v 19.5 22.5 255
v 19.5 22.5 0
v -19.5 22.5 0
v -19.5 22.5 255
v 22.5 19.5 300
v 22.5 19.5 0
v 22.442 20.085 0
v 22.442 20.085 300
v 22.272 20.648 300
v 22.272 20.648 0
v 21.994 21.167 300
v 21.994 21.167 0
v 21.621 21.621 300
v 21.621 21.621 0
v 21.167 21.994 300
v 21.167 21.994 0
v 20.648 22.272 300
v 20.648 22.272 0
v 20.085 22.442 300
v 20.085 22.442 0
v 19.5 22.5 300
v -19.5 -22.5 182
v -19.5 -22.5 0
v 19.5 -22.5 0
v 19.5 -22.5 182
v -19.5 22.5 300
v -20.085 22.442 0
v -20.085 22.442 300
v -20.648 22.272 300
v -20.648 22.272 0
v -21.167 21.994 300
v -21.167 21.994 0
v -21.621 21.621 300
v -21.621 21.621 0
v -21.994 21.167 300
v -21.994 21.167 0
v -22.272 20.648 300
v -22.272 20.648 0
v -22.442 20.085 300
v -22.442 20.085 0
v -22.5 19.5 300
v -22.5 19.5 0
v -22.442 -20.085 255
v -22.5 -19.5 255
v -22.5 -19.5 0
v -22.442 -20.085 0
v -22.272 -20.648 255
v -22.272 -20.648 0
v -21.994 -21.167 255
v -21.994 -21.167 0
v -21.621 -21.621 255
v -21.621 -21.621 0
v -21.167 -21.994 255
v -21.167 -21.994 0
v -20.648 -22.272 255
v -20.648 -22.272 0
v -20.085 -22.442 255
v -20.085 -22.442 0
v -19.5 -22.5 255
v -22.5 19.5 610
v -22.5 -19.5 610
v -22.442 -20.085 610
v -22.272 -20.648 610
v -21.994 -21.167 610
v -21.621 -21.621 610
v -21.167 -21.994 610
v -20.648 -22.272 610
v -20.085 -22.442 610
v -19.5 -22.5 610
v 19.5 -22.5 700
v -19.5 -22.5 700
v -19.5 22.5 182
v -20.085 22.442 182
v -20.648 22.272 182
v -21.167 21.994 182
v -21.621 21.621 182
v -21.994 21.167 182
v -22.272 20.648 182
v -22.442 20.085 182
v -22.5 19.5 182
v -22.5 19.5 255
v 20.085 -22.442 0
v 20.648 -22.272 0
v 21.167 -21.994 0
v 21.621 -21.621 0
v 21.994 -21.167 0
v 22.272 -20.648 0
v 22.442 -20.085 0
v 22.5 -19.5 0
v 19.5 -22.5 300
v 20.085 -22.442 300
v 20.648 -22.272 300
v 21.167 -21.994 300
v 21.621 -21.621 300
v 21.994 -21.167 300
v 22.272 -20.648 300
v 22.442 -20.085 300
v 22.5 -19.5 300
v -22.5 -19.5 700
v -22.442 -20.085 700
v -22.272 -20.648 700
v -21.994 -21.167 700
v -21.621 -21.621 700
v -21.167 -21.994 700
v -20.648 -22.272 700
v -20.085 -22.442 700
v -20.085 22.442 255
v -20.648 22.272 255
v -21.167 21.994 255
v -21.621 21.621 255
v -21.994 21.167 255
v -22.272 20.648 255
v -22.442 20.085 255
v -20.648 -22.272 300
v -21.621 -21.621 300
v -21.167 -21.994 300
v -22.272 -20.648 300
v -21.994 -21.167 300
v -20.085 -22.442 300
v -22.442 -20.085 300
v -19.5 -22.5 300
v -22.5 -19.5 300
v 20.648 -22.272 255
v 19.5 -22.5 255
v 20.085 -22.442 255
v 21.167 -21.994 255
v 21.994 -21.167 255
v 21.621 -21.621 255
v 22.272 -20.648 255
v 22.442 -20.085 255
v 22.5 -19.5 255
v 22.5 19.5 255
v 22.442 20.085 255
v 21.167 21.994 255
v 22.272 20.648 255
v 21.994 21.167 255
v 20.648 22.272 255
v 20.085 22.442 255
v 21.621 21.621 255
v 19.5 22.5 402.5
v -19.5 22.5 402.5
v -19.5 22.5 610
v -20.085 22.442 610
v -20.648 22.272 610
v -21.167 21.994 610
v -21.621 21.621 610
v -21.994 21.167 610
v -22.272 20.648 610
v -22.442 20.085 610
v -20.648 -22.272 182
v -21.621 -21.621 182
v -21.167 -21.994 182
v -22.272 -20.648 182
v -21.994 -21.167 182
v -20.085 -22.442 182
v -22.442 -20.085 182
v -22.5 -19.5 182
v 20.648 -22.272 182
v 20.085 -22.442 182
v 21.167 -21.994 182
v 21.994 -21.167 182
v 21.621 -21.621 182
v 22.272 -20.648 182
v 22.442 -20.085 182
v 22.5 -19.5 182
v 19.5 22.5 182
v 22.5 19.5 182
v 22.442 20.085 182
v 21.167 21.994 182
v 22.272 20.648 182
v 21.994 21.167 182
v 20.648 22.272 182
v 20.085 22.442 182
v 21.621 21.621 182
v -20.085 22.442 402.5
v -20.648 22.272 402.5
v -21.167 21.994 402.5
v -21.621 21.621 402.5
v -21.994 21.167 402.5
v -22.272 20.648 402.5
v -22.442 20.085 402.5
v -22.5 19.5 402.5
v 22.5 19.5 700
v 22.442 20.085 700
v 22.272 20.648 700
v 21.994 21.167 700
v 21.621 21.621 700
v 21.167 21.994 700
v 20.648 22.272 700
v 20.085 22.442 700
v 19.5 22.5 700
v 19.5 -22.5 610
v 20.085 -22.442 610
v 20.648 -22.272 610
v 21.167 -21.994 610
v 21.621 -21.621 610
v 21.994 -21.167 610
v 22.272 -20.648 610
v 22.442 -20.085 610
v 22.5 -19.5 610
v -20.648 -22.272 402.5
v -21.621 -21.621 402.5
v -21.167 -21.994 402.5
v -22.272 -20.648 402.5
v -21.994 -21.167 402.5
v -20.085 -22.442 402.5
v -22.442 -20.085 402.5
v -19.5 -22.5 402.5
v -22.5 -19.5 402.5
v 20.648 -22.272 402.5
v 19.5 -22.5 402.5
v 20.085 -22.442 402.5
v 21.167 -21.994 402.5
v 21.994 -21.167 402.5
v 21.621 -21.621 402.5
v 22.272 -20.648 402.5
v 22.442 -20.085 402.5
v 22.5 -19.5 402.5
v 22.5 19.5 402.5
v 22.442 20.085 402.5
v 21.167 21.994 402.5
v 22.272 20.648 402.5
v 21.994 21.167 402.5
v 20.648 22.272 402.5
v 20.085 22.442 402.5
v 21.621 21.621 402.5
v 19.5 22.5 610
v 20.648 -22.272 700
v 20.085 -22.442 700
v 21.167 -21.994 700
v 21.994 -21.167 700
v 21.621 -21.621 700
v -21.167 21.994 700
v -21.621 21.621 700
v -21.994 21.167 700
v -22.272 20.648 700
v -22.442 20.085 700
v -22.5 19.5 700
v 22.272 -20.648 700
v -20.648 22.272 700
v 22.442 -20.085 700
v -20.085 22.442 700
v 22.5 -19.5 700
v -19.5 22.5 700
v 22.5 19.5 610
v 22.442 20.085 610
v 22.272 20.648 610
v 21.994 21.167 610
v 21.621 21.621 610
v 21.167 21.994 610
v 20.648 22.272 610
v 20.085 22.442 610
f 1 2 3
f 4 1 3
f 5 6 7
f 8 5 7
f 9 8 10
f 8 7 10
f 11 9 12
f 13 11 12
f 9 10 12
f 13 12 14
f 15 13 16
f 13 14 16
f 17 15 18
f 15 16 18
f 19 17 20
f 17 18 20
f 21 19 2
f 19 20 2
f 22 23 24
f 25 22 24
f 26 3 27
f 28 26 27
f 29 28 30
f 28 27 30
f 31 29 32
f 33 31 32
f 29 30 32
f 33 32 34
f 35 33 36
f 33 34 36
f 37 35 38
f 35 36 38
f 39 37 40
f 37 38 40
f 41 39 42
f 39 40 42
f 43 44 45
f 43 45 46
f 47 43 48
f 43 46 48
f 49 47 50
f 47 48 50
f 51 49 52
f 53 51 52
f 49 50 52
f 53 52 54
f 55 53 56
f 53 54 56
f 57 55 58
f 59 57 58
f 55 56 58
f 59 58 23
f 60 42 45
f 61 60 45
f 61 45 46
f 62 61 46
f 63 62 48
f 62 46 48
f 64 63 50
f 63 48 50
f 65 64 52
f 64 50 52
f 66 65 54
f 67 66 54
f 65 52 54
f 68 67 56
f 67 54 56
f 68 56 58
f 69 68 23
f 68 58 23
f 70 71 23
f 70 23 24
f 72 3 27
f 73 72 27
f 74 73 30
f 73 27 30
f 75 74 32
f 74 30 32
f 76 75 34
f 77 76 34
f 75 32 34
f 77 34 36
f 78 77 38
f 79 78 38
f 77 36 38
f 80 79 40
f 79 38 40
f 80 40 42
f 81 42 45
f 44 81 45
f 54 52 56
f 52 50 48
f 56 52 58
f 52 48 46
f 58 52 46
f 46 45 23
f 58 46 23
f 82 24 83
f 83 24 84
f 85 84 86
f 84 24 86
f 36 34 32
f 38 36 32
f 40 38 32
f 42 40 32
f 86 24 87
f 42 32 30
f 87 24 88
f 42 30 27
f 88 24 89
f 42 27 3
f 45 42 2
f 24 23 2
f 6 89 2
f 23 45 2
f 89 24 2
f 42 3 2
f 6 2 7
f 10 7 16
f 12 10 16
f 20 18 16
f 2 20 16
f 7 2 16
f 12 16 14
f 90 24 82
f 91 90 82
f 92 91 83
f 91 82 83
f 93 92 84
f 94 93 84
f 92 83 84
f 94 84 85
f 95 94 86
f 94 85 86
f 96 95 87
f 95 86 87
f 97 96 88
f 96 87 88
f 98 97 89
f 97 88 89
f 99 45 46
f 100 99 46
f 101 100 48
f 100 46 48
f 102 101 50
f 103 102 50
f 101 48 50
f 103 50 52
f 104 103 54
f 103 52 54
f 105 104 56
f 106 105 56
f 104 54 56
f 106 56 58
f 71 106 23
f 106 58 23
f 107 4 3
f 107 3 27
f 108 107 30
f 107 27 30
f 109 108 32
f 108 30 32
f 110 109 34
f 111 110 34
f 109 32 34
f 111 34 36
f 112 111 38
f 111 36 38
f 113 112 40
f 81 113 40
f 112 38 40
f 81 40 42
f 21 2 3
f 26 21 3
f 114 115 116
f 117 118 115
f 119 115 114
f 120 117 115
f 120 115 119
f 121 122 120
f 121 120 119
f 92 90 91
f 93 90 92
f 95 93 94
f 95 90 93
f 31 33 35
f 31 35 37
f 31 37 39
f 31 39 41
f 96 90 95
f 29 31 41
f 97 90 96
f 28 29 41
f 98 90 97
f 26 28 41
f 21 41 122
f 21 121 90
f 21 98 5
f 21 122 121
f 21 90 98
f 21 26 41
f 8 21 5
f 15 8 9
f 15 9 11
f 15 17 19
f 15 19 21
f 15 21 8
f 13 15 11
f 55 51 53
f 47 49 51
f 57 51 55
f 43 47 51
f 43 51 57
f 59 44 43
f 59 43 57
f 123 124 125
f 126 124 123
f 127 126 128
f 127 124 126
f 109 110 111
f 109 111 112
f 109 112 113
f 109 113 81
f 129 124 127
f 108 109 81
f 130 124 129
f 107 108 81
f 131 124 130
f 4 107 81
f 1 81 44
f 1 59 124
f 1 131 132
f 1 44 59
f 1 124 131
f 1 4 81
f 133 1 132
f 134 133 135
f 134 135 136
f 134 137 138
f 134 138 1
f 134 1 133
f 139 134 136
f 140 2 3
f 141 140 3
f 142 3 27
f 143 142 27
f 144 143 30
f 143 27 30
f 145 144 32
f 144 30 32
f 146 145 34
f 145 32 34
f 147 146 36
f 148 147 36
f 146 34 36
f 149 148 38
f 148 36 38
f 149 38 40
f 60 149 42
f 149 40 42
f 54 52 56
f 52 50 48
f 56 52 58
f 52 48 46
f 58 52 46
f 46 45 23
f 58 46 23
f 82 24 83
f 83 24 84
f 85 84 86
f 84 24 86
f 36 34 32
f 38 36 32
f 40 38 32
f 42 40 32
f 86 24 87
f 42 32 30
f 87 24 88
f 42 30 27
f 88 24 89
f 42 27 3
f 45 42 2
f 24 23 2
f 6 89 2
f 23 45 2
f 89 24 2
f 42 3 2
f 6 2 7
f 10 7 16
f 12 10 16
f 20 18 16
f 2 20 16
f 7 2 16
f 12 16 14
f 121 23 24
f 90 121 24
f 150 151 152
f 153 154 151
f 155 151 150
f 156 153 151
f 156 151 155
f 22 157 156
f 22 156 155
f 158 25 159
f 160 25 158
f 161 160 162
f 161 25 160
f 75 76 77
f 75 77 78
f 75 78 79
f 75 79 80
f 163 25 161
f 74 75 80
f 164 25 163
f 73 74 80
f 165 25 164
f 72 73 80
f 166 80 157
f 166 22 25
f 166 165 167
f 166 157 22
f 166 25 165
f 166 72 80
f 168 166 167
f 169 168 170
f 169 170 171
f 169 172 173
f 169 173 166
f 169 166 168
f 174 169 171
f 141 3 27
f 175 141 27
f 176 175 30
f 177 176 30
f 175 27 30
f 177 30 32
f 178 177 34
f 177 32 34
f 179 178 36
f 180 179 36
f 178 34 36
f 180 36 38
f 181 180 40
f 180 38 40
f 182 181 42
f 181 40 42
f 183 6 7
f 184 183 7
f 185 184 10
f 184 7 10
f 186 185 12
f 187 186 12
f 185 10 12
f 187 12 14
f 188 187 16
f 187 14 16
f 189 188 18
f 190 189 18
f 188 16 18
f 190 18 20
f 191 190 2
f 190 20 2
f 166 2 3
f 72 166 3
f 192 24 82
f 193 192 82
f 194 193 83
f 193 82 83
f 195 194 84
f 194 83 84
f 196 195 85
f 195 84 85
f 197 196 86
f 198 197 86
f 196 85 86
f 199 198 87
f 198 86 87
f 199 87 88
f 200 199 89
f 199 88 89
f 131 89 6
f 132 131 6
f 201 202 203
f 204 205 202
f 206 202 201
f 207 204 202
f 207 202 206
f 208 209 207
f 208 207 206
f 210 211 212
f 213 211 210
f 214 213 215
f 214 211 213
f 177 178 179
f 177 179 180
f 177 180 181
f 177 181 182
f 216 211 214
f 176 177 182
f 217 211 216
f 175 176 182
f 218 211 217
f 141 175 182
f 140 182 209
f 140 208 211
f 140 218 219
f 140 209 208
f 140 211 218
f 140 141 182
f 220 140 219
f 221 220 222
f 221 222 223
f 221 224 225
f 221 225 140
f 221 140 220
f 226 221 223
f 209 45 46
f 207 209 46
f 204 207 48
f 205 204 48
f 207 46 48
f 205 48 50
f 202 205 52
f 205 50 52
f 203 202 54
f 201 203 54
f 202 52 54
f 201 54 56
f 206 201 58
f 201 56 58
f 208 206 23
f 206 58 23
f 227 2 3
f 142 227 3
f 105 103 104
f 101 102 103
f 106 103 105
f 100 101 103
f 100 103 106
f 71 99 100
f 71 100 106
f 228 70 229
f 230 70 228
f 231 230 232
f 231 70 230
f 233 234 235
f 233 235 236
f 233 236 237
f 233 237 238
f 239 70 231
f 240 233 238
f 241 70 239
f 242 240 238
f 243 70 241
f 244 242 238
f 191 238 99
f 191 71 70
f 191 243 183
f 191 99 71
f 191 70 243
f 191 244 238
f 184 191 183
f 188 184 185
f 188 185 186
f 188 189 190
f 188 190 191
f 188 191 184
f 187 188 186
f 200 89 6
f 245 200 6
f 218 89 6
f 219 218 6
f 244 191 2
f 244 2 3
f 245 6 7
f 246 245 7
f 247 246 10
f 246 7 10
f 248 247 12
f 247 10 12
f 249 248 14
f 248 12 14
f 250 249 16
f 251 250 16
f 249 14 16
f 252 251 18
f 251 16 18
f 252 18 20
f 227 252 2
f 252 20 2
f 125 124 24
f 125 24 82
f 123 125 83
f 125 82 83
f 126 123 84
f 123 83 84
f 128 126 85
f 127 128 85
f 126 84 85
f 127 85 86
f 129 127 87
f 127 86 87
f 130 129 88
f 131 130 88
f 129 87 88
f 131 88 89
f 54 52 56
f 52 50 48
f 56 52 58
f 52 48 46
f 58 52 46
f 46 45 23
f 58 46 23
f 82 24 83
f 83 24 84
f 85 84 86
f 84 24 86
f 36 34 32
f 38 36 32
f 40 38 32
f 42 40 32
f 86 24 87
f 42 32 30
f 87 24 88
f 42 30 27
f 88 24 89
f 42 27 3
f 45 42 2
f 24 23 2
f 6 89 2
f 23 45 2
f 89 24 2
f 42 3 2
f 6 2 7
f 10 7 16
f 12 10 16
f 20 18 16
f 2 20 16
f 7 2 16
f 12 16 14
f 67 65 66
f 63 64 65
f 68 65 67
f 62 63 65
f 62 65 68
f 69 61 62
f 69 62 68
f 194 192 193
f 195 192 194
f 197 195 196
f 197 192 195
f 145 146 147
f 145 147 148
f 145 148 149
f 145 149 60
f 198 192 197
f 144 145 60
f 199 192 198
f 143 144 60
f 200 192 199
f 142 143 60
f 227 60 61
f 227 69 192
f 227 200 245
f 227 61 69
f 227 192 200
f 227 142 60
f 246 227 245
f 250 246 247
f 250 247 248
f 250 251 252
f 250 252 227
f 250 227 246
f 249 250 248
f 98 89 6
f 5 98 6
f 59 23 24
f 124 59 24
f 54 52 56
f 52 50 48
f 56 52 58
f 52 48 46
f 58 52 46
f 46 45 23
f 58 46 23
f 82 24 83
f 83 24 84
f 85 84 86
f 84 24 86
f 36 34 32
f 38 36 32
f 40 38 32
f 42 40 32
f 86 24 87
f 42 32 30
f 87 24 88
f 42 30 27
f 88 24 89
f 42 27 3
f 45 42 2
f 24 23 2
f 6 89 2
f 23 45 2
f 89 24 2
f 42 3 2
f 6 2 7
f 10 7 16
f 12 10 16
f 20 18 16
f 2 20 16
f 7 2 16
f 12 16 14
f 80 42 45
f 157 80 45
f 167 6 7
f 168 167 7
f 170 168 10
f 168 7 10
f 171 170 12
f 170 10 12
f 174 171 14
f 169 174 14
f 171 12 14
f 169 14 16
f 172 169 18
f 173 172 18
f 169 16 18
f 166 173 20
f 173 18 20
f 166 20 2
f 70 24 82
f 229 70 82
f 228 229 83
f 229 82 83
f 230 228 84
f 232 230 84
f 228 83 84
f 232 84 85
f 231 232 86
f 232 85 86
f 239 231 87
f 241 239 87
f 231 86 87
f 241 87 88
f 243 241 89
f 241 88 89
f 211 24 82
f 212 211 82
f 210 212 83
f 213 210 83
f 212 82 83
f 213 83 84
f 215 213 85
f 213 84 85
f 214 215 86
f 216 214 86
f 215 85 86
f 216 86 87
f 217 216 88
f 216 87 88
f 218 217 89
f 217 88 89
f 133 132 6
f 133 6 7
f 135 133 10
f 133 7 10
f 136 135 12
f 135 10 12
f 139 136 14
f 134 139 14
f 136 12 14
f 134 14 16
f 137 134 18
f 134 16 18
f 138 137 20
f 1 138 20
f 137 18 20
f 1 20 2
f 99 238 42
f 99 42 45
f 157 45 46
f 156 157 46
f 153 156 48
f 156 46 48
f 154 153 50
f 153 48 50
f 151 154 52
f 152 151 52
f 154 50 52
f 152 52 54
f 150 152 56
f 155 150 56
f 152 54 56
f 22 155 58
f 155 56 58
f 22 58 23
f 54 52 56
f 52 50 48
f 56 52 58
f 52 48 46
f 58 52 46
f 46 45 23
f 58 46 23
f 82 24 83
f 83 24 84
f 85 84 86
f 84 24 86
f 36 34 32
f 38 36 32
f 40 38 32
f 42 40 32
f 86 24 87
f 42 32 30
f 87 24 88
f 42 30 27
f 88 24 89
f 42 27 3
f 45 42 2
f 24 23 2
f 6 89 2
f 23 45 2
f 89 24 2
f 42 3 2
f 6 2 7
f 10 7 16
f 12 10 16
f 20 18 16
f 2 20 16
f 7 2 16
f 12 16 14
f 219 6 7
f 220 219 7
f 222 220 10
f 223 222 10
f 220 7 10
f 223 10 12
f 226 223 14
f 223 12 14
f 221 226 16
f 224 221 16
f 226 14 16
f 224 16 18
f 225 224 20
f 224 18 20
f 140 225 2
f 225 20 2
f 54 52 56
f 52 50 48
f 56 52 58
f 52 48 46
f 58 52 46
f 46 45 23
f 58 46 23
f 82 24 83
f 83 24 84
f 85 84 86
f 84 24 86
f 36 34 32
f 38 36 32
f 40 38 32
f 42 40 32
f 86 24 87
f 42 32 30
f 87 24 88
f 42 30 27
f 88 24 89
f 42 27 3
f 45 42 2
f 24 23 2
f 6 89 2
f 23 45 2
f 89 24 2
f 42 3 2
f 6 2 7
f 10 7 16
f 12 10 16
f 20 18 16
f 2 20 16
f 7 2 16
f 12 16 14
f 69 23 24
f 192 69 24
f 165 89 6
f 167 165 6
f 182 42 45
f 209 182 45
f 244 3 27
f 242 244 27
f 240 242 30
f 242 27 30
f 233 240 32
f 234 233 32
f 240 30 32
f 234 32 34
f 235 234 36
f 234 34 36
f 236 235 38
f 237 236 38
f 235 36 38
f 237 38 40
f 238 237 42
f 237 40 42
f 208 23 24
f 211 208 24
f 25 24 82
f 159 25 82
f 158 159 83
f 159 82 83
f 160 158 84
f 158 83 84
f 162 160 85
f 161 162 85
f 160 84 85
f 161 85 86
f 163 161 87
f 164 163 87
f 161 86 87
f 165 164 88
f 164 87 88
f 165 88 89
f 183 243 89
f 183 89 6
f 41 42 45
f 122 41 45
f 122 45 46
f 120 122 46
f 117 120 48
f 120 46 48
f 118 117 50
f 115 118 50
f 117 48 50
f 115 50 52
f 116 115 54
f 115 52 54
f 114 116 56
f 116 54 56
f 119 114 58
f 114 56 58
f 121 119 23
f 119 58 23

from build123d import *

# Parameters (mm, degrees)
F1_DEPTH = 610
F2_DEPTH = 700
F3_DEPTH = 300
F4_DEPTH = 255
F5_DEPTH = 182
F6_DEPTH = 402.5


with BuildPart() as f1:
    # F0 (on Top) → F1 (new body)
    with BuildSketch(Plane.XY):
        with BuildLine():
            ThreePointArc((22.5, 19.5), (21.62132, 21.62132), (19.5, 22.5))
            Line((19.5, 22.5), (-19.5, 22.5))
            ThreePointArc((-19.5, 22.5), (-21.62132, 21.62132), (-22.5, 19.5))
            Line((-22.5, 19.5), (-22.5, -19.5))
            ThreePointArc((-22.5, -19.5), (-21.62132, -21.62132), (-19.5, -22.5))
            Line((-19.5, -22.5), (19.5, -22.5))
            ThreePointArc((19.5, -22.5), (21.62132, -21.62132), (22.5, -19.5))
            Line((22.5, -19.5), (22.5, 19.5))
        make_face()
    extrude(amount=F1_DEPTH)


with BuildPart() as f2:
    # F0 (on Top) → F2 (new body)
    with BuildSketch(Plane.XY):
        with BuildLine():
            ThreePointArc((22.5, 19.5), (21.62132, 21.62132), (19.5, 22.5))
            Line((19.5, 22.5), (-19.5, 22.5))
            ThreePointArc((-19.5, 22.5), (-21.62132, 21.62132), (-22.5, 19.5))
            Line((-22.5, 19.5), (-22.5, -19.5))
            ThreePointArc((-22.5, -19.5), (-21.62132, -21.62132), (-19.5, -22.5))
            Line((-19.5, -22.5), (19.5, -22.5))
            ThreePointArc((19.5, -22.5), (21.62132, -21.62132), (22.5, -19.5))
            Line((22.5, -19.5), (22.5, 19.5))
        make_face()
    extrude(amount=F2_DEPTH)


with BuildPart() as f3:
    # F0 (on Top) → F3 (new body)
    with BuildSketch(Plane.XY):
        with BuildLine():
            ThreePointArc((22.5, 19.5), (21.62132, 21.62132), (19.5, 22.5))
            Line((19.5, 22.5), (-19.5, 22.5))
            ThreePointArc((-19.5, 22.5), (-21.62132, 21.62132), (-22.5, 19.5))
            Line((-22.5, 19.5), (-22.5, -19.5))
            ThreePointArc((-22.5, -19.5), (-21.62132, -21.62132), (-19.5, -22.5))
            Line((-19.5, -22.5), (19.5, -22.5))
            ThreePointArc((19.5, -22.5), (21.62132, -21.62132), (22.5, -19.5))
            Line((22.5, -19.5), (22.5, 19.5))
        make_face()
    extrude(amount=F3_DEPTH)


with BuildPart() as f4:
    # F0 (on Top) → F4 (new body)
    with BuildSketch(Plane.XY):
        with BuildLine():
            ThreePointArc((22.5, 19.5), (21.62132, 21.62132), (19.5, 22.5))
            Line((19.5, 22.5), (-19.5, 22.5))
            ThreePointArc((-19.5, 22.5), (-21.62132, 21.62132), (-22.5, 19.5))
            Line((-22.5, 19.5), (-22.5, -19.5))
            ThreePointArc((-22.5, -19.5), (-21.62132, -21.62132), (-19.5, -22.5))
            Line((-19.5, -22.5), (19.5, -22.5))
            ThreePointArc((19.5, -22.5), (21.62132, -21.62132), (22.5, -19.5))
            Line((22.5, -19.5), (22.5, 19.5))
        make_face()
    extrude(amount=F4_DEPTH)


with BuildPart() as f5:
    # F0 (on Top) → F5 (new body)
    with BuildSketch(Plane.XY):
        with BuildLine():
            ThreePointArc((22.5, 19.5), (21.62132, 21.62132), (19.5, 22.5))
            Line((19.5, 22.5), (-19.5, 22.5))
            ThreePointArc((-19.5, 22.5), (-21.62132, 21.62132), (-22.5, 19.5))
            Line((-22.5, 19.5), (-22.5, -19.5))
            ThreePointArc((-22.5, -19.5), (-21.62132, -21.62132), (-19.5, -22.5))
            Line((-19.5, -22.5), (19.5, -22.5))
            ThreePointArc((19.5, -22.5), (21.62132, -21.62132), (22.5, -19.5))
            Line((22.5, -19.5), (22.5, 19.5))
        make_face()
    extrude(amount=F5_DEPTH)


with BuildPart() as f6:
    # F0 (on Top) → F6 (new body)
    with BuildSketch(Plane.XY):
        with BuildLine():
            ThreePointArc((22.5, 19.5), (21.62132, 21.62132), (19.5, 22.5))
            Line((19.5, 22.5), (-19.5, 22.5))
            ThreePointArc((-19.5, 22.5), (-21.62132, 21.62132), (-22.5, 19.5))
            Line((-22.5, 19.5), (-22.5, -19.5))
            ThreePointArc((-22.5, -19.5), (-21.62132, -21.62132), (-19.5, -22.5))
            Line((-19.5, -22.5), (19.5, -22.5))
            ThreePointArc((19.5, -22.5), (21.62132, -21.62132), (22.5, -19.5))
            Line((22.5, -19.5), (22.5, 19.5))
        make_face()
    extrude(amount=F6_DEPTH)


solid = Compound([f1.part, f2.part, f3.part, f4.part, f5.part, f6.part])
